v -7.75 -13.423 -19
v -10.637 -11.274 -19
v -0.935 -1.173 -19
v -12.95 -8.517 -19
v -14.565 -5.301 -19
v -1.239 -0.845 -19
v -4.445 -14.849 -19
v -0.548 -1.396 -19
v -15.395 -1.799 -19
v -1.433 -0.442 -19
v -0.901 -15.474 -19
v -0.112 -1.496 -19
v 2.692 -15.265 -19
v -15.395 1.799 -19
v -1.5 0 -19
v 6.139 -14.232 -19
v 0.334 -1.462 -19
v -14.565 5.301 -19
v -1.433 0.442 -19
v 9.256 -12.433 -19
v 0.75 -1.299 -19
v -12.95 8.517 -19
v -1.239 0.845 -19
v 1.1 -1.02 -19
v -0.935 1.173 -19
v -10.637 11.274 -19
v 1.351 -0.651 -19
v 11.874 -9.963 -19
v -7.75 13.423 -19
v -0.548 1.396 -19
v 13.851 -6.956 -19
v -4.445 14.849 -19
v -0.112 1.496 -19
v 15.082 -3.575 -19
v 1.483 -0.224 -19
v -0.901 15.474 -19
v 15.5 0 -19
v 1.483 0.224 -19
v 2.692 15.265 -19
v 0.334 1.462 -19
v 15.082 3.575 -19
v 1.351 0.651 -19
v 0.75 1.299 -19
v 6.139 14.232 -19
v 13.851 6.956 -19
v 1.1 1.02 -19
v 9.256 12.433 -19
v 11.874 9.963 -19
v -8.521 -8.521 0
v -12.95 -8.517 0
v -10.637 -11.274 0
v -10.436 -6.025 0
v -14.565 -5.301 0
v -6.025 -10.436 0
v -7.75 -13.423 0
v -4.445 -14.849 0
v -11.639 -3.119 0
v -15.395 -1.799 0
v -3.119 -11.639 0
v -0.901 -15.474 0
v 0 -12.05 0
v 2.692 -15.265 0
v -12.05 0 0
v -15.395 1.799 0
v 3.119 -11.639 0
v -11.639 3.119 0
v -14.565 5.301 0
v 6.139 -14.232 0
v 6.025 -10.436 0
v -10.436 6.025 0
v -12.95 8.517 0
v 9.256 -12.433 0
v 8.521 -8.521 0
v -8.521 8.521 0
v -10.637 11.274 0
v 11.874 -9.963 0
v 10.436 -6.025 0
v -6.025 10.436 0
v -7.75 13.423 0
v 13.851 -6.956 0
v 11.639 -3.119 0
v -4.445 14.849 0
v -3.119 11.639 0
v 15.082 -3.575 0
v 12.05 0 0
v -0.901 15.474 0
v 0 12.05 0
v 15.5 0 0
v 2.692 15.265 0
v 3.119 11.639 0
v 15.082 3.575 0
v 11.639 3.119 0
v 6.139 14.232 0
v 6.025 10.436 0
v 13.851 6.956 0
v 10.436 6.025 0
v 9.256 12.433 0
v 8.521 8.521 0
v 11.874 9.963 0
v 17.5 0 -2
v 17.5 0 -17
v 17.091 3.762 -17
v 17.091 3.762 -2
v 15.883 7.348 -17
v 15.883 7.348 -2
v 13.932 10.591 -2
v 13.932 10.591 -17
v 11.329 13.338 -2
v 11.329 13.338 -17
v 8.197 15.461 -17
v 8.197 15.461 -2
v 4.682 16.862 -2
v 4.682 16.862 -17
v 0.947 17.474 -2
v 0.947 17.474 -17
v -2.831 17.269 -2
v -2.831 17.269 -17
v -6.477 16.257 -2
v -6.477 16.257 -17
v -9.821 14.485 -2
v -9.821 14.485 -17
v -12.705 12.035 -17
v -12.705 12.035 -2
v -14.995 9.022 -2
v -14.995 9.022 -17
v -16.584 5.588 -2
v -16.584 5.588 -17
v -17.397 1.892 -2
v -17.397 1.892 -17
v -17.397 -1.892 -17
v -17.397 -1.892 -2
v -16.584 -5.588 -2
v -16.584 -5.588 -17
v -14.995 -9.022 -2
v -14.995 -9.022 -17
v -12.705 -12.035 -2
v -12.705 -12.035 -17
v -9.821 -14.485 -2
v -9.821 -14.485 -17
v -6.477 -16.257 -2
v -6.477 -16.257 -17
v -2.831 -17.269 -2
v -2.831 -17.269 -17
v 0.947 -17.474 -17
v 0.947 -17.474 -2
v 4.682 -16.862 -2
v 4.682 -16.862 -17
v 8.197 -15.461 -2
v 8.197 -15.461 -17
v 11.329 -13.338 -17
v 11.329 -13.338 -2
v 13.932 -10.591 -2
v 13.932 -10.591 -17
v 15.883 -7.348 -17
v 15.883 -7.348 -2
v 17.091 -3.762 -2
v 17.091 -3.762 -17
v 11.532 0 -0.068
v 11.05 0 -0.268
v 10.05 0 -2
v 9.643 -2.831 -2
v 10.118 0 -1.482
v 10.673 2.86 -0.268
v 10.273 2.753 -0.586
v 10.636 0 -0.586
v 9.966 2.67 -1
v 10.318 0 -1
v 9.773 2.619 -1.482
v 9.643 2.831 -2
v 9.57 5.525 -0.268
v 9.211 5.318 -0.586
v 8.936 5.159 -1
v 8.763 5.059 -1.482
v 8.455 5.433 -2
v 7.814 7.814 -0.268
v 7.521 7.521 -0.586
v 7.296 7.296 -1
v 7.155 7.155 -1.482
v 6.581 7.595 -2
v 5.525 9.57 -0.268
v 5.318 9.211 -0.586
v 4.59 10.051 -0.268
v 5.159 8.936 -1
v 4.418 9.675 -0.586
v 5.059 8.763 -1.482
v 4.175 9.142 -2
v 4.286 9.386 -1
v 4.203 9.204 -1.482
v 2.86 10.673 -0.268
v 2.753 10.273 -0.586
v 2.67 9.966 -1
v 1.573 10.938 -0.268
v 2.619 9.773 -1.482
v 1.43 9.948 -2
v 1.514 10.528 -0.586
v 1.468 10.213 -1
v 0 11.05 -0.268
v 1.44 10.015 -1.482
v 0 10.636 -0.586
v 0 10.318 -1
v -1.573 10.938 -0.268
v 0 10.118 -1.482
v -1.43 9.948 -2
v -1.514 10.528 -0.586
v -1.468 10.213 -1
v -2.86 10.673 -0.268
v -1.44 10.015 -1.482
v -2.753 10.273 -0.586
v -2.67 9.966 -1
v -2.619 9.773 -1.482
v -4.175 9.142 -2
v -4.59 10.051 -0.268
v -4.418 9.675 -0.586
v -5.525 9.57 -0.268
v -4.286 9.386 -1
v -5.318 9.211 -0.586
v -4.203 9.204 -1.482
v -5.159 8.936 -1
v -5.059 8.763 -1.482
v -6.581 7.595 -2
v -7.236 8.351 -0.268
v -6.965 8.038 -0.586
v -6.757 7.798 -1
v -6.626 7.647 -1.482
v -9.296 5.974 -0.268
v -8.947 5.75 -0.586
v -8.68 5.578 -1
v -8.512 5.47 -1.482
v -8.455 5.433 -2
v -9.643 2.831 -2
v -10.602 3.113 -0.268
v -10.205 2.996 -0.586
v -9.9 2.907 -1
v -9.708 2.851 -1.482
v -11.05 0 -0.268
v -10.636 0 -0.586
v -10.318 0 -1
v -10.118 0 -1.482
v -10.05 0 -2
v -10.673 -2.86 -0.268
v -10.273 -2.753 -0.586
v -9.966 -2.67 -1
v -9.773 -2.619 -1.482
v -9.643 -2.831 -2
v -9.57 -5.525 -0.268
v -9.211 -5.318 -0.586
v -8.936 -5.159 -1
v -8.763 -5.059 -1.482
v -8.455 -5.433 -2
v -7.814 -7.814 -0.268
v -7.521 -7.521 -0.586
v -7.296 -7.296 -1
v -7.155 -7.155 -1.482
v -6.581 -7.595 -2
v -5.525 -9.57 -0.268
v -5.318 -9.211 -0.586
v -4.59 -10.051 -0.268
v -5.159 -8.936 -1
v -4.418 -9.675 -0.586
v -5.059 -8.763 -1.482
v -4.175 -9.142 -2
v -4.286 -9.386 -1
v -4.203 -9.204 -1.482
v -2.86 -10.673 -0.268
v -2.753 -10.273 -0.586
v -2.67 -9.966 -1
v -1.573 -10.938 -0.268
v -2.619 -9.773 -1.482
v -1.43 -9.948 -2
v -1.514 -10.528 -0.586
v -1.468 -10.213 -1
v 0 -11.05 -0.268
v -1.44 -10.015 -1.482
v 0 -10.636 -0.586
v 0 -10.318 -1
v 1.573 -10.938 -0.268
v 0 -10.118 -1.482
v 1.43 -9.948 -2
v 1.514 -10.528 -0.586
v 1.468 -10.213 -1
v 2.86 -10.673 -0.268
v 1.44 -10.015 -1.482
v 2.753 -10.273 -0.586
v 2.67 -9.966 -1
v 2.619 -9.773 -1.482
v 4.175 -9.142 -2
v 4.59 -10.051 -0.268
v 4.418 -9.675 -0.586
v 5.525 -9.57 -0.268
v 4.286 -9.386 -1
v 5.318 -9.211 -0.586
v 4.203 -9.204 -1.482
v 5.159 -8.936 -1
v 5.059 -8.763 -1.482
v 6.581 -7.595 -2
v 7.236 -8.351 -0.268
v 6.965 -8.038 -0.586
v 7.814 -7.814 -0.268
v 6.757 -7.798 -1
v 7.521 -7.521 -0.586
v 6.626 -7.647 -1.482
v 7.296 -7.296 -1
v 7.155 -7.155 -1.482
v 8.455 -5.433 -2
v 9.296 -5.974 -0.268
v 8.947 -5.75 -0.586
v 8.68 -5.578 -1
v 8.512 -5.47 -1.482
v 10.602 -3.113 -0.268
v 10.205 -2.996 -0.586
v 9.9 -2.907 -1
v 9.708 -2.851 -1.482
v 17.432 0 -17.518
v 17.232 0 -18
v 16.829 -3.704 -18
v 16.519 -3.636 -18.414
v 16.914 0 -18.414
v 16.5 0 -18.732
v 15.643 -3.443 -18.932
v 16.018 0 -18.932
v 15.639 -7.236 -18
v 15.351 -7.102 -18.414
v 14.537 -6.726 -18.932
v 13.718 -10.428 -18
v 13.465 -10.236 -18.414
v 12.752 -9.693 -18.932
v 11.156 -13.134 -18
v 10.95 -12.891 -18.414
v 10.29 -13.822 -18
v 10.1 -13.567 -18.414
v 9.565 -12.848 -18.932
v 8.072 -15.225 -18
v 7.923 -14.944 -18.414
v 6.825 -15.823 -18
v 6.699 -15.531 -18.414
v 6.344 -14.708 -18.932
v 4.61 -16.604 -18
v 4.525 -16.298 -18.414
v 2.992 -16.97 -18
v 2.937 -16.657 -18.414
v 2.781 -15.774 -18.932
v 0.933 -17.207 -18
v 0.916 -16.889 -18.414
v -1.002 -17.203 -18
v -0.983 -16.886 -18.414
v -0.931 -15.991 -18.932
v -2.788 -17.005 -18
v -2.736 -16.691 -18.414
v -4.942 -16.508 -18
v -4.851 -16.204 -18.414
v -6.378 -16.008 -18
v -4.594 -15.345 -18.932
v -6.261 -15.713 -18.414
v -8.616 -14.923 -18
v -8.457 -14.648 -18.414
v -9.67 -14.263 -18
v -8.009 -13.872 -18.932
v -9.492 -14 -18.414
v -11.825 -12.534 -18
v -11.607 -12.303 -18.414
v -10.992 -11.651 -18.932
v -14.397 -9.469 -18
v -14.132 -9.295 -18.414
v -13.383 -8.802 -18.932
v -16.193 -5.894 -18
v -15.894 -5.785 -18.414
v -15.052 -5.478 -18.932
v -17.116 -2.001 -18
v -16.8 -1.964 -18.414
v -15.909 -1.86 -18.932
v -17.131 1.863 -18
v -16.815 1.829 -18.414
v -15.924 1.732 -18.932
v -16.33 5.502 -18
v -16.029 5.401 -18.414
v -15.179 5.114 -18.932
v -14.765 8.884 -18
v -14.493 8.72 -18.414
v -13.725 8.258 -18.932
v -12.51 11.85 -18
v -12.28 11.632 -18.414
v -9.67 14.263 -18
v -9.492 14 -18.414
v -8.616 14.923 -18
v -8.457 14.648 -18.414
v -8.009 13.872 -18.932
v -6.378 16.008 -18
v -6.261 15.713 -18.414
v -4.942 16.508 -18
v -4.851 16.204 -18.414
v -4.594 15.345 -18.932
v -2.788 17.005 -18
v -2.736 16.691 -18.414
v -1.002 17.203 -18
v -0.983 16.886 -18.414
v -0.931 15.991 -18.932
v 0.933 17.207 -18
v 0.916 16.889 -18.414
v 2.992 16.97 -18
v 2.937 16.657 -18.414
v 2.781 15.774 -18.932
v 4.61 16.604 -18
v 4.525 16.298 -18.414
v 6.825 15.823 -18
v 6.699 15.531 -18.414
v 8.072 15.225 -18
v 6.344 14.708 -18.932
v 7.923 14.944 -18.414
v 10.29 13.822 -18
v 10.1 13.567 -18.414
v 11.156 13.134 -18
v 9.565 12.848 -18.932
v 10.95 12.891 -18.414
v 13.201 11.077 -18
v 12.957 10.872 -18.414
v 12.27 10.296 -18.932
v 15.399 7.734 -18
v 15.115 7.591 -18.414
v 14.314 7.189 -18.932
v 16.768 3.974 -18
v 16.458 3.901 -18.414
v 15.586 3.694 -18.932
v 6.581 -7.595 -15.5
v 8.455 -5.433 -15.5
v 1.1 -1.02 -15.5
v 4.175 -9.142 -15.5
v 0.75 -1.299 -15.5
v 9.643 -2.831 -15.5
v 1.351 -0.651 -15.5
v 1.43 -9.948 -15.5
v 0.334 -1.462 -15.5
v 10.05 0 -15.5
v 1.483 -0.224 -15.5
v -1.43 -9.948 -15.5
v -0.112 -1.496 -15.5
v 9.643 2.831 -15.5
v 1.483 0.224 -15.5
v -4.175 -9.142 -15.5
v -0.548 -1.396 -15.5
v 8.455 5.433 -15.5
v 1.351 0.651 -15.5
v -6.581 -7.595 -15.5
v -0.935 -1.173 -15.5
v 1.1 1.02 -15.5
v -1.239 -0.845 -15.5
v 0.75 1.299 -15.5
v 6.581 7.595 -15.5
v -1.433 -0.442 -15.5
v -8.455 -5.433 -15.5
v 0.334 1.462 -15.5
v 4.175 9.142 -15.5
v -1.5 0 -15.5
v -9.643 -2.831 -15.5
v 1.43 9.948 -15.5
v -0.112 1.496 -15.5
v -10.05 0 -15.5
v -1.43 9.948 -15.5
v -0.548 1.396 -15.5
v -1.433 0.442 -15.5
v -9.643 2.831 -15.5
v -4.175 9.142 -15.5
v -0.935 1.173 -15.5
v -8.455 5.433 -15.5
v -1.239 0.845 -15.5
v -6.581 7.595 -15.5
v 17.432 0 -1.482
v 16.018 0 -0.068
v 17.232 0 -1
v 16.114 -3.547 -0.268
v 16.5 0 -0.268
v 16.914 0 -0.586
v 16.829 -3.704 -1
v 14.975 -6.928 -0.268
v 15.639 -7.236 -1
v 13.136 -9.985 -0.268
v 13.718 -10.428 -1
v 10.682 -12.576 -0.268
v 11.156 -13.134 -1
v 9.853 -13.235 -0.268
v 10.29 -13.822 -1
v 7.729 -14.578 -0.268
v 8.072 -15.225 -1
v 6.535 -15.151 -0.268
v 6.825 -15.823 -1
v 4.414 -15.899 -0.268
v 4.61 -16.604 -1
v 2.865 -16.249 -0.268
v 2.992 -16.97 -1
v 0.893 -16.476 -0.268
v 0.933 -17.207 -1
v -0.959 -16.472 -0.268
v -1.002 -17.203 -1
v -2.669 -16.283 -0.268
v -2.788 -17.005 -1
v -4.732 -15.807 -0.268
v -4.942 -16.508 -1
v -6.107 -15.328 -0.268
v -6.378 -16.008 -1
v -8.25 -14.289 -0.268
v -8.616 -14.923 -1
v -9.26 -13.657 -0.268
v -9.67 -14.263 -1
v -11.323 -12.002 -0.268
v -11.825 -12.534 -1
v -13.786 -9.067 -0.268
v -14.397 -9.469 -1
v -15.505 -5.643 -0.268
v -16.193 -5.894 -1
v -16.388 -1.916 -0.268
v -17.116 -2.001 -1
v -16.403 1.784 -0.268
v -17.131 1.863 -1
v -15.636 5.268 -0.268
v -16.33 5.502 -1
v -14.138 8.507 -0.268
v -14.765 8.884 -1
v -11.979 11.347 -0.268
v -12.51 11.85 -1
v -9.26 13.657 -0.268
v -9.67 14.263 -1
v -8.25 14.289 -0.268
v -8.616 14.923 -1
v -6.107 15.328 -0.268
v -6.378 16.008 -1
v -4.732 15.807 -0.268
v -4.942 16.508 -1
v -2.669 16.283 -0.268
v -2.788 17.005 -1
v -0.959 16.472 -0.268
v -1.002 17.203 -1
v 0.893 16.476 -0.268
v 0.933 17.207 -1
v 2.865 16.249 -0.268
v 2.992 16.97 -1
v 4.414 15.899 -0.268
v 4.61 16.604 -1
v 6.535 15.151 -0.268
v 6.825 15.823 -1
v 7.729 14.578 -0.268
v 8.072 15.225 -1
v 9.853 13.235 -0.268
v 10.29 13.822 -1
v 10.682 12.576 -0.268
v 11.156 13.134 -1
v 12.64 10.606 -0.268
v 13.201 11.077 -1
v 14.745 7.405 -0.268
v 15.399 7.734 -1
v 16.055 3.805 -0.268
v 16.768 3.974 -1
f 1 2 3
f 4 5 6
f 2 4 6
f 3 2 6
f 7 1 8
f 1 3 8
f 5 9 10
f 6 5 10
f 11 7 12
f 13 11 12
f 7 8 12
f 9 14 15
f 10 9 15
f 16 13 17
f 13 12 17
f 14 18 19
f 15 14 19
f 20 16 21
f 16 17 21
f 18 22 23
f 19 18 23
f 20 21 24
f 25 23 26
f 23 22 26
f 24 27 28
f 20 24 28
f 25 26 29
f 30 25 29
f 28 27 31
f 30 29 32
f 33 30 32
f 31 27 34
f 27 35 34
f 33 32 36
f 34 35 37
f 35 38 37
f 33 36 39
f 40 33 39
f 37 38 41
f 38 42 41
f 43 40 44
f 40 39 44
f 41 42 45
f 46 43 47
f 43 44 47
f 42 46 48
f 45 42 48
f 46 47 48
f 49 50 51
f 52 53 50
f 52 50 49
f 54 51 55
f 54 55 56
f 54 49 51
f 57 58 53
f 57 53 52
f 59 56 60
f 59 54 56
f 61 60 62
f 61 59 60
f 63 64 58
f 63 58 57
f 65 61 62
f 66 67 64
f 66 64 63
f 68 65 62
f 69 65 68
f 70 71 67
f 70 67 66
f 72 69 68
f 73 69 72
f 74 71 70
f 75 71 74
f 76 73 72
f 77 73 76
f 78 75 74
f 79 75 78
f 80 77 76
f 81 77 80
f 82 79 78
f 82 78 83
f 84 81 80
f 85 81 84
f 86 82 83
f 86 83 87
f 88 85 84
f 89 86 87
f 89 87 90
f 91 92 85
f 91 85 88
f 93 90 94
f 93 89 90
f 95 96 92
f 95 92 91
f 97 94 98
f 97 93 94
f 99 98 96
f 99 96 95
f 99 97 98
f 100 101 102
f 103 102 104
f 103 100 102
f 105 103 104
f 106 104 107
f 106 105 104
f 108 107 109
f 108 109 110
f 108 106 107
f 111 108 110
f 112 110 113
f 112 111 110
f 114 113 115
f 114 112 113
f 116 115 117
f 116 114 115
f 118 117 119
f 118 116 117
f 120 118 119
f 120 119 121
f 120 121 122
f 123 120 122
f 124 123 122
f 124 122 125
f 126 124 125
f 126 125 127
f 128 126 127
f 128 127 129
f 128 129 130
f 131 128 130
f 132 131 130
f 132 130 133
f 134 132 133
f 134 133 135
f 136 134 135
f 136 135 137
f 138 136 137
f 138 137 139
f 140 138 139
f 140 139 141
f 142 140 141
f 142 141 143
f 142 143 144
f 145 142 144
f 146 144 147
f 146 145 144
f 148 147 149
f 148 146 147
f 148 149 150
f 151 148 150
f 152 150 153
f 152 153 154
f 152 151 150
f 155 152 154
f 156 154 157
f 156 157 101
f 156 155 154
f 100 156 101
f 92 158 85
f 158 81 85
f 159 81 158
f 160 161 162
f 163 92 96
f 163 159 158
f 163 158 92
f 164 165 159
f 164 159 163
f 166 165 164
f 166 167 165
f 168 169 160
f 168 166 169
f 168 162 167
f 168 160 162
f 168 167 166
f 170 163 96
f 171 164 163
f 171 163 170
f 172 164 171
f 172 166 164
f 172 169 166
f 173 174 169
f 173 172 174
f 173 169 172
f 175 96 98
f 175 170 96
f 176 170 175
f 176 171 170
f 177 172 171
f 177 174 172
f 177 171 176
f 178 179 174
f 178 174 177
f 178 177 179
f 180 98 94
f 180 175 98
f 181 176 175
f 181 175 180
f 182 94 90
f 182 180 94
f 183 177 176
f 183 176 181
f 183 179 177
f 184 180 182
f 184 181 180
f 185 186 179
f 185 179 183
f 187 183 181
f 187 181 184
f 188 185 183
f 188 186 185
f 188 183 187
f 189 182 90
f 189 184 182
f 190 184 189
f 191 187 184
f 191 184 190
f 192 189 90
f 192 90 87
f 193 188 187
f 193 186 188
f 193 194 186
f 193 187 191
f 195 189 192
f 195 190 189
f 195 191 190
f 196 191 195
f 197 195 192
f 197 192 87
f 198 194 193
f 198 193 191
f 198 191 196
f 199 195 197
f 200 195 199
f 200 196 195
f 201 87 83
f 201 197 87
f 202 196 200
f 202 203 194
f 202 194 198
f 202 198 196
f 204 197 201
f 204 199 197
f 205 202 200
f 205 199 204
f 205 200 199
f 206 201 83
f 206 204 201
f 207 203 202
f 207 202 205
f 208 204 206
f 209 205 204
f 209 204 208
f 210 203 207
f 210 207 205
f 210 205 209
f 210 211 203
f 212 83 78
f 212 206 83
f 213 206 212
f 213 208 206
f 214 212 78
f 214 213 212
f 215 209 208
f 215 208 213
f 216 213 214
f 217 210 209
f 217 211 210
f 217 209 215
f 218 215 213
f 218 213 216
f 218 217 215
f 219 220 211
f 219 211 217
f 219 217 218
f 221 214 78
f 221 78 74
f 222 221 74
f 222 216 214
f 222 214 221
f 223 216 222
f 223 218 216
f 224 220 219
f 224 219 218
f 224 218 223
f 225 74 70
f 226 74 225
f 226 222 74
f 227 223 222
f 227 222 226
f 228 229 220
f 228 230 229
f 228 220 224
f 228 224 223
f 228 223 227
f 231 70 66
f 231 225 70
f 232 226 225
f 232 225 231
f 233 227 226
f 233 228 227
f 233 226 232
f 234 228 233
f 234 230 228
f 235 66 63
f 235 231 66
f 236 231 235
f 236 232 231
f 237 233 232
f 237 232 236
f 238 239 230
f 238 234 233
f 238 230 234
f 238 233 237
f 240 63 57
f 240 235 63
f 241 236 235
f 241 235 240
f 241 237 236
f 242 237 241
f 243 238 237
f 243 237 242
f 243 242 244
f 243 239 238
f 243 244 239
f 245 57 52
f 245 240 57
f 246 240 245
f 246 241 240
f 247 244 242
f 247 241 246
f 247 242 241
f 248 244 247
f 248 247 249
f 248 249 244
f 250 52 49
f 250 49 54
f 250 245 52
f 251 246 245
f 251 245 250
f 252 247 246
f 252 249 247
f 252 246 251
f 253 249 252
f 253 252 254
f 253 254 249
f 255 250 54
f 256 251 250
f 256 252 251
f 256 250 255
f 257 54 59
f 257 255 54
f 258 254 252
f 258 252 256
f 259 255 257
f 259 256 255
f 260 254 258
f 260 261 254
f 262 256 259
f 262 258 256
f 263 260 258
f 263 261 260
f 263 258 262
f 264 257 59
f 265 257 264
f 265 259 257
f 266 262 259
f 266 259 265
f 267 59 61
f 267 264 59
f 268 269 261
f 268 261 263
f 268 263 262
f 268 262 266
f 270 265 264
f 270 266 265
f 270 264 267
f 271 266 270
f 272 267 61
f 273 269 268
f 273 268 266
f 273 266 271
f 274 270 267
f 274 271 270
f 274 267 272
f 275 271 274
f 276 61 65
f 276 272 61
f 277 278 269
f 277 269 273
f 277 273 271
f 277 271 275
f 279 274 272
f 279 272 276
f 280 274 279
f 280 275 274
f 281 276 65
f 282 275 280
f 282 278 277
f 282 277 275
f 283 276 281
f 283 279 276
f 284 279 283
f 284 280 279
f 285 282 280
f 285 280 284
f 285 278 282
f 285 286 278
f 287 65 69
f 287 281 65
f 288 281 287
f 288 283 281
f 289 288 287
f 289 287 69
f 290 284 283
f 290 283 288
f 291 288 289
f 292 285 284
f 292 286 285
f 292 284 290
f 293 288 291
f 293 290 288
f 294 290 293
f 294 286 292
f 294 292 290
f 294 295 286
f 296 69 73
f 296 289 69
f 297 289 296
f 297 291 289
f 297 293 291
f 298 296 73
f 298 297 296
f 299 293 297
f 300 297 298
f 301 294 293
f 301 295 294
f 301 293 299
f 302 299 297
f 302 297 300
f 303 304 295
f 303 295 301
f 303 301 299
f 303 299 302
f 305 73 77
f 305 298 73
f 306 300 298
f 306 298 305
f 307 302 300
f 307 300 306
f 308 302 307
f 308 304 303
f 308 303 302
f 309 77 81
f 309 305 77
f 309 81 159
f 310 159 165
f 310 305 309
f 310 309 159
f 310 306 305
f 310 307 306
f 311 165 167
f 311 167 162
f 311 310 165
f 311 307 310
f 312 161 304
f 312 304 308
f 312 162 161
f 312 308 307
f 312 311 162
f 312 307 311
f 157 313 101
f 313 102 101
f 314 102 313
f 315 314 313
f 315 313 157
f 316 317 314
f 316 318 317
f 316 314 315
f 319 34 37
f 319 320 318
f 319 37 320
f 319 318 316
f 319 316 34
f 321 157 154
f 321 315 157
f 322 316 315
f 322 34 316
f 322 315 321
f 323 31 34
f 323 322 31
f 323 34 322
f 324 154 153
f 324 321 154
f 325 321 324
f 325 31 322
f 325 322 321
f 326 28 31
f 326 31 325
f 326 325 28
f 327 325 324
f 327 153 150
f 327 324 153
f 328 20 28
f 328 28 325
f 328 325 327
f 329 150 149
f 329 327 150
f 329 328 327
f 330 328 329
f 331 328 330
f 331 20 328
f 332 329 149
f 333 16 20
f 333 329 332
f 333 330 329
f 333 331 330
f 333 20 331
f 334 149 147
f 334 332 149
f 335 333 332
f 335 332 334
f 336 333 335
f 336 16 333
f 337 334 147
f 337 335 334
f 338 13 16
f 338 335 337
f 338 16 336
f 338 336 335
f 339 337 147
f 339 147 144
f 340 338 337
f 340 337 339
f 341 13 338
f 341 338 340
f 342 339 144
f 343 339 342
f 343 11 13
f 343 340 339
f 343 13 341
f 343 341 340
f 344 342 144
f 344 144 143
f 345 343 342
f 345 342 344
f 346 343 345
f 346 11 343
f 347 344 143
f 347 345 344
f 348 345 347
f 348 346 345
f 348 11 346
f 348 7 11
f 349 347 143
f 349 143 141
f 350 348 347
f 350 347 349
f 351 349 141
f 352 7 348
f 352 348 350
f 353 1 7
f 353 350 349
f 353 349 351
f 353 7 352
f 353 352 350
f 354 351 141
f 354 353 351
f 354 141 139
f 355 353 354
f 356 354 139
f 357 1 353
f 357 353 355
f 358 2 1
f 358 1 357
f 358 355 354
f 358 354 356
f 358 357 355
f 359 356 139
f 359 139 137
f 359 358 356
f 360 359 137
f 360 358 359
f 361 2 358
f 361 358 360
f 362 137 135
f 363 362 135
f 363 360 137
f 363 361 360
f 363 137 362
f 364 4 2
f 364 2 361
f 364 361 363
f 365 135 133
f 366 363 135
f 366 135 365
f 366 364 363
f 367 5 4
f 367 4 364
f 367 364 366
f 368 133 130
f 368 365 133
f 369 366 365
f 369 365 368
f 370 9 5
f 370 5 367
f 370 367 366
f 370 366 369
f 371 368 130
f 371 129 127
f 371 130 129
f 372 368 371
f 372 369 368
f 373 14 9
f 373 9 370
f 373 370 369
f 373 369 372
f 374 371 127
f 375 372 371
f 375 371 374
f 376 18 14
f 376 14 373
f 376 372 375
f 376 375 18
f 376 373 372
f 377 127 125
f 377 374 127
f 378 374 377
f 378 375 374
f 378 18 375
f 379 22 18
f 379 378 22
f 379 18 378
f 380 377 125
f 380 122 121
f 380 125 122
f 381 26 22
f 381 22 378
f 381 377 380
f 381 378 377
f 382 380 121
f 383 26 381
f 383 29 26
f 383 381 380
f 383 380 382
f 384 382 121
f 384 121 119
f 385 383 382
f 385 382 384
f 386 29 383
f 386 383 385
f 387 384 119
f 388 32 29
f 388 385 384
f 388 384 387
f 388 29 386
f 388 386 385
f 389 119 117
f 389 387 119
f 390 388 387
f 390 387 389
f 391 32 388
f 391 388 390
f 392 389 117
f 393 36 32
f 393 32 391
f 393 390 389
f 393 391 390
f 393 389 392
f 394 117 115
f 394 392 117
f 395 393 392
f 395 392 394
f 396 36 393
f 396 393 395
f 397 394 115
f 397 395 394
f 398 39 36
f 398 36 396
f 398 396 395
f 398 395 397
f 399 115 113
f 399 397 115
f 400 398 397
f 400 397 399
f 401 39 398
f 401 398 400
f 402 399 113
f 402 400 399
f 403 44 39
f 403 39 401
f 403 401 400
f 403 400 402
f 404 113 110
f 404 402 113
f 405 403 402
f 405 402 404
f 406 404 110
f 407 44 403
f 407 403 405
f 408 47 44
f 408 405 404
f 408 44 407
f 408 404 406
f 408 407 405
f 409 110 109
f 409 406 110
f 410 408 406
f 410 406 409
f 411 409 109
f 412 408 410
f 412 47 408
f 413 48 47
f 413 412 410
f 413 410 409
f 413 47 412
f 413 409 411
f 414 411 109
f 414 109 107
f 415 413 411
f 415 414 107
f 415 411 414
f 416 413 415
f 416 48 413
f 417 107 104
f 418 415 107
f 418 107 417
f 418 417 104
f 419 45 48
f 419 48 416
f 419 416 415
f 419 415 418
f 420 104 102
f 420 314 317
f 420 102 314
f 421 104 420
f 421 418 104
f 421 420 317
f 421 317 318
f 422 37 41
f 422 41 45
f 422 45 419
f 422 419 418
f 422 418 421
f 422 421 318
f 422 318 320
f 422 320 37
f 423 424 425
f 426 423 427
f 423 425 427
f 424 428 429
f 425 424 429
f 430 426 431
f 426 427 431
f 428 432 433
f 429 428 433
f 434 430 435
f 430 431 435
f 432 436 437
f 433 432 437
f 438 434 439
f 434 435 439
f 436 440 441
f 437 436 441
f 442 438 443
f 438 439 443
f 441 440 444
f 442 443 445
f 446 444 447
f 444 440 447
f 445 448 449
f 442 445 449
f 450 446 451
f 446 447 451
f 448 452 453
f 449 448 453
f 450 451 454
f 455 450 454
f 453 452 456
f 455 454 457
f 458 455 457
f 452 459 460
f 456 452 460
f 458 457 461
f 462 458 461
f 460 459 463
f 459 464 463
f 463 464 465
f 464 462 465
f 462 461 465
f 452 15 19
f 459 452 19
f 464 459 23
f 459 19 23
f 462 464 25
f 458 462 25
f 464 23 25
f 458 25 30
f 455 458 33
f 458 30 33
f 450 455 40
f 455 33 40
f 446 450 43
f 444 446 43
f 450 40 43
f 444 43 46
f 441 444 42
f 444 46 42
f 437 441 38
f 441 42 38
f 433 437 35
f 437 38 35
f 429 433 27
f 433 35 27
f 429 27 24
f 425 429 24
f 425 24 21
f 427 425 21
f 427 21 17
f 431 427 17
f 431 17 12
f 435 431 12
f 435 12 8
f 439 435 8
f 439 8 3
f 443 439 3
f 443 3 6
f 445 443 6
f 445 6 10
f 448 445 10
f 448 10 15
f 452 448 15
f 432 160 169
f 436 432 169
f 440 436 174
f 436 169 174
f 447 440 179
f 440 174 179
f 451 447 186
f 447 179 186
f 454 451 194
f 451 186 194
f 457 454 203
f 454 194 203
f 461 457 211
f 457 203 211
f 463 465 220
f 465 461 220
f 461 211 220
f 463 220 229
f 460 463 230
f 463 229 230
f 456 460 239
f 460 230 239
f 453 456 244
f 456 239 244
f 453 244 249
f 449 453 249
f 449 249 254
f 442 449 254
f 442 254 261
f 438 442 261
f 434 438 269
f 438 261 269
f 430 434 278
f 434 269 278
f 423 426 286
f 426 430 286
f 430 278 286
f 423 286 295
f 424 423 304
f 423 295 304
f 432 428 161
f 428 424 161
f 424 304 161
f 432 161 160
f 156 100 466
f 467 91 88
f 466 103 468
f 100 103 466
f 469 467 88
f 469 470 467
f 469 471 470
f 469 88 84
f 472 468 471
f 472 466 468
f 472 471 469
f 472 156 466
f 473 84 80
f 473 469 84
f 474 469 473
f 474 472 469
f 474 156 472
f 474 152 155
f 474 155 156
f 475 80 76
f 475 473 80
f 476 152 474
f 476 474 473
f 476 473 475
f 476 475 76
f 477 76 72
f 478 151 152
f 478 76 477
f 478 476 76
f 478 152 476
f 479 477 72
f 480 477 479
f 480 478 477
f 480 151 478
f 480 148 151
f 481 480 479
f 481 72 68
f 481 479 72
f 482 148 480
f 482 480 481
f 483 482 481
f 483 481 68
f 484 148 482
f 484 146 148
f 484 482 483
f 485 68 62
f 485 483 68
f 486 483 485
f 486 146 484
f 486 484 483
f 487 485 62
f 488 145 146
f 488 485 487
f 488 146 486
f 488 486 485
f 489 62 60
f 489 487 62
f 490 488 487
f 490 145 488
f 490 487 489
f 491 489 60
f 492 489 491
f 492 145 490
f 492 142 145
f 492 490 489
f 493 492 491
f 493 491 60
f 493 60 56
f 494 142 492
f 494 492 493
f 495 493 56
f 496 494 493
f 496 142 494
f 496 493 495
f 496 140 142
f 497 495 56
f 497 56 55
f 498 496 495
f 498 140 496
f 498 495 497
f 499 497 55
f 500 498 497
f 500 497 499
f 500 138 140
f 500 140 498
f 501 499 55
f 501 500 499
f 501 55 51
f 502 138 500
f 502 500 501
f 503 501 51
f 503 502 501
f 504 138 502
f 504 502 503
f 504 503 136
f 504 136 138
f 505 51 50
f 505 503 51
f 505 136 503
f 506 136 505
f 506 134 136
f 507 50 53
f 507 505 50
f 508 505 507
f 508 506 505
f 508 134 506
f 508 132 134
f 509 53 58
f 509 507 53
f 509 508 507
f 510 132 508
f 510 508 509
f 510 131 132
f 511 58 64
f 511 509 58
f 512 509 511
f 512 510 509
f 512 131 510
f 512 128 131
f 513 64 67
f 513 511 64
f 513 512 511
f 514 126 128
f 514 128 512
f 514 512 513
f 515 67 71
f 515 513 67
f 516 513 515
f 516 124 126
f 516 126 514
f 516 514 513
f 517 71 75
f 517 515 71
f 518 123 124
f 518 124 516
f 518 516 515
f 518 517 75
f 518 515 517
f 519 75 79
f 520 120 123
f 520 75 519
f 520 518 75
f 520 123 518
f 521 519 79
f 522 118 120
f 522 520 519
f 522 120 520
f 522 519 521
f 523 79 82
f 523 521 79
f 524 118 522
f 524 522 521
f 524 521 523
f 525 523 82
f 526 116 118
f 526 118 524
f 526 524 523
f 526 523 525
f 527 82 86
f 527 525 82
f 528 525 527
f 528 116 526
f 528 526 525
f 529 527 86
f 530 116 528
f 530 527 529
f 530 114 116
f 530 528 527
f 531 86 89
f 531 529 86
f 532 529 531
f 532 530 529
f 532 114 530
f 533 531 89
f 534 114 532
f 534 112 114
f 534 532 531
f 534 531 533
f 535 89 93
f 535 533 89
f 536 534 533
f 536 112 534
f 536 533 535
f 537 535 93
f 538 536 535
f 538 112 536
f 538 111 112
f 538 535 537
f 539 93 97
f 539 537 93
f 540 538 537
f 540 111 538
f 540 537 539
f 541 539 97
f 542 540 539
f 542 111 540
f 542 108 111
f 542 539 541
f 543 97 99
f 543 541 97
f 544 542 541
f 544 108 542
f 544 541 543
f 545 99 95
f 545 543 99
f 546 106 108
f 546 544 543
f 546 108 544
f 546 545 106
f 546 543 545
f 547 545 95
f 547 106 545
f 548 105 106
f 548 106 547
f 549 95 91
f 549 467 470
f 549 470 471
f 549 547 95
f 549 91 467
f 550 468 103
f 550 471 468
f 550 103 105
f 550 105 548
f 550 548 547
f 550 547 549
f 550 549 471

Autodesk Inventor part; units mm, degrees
ref_plane "YZ Plane" through (0, 0, 0) normal (1, 0, 0) x (0, 1, 0)
ref_plane "XZ Plane" through (0, 0, 0) normal (0, 1, 0) x (-1, 0, 0)
ref_plane "XY Plane" through (0, 0, 0) normal (0, 0, 1) x (1, 0, 0)
sketch "Sketch1" plane through (0, 0, 0) normal (0, 0, 1) x (1, 0, 0)
  circle A0 centre (0, 0) radius 10.05
  circle A1 centre (0, 0) radius 17.5
  dimension "d0" = 20.1
  dimension "d2" = 35
extrude "Extrusion1" add sketch "Sketch1" against normal blind 19
sketch "Sketch2" plane through (0, 0, -19) normal (0, 0, -1) x (-1, 0, 0)
  circle A0 centre (0, 0) radius 10.05
  circle A1 centre (0, 0) radius 1.5
  dimension "d7" = 3
extrude "Extrusion2" add sketch "Sketch2" against normal blind 3.5 contours A0 | A1
extrude "Extrusion3" cut sketch "Sketch2" against normal blind 3.5 contours A1
fillet "Fillet1" radius 2 1 edges at (-10.05, 0, 0)
fillet "Fillet2" radius 2 2 edges at (-17.5, 0, 0) (-17.5, 0, -19)
properties part number "rulmanyatagıipt"
